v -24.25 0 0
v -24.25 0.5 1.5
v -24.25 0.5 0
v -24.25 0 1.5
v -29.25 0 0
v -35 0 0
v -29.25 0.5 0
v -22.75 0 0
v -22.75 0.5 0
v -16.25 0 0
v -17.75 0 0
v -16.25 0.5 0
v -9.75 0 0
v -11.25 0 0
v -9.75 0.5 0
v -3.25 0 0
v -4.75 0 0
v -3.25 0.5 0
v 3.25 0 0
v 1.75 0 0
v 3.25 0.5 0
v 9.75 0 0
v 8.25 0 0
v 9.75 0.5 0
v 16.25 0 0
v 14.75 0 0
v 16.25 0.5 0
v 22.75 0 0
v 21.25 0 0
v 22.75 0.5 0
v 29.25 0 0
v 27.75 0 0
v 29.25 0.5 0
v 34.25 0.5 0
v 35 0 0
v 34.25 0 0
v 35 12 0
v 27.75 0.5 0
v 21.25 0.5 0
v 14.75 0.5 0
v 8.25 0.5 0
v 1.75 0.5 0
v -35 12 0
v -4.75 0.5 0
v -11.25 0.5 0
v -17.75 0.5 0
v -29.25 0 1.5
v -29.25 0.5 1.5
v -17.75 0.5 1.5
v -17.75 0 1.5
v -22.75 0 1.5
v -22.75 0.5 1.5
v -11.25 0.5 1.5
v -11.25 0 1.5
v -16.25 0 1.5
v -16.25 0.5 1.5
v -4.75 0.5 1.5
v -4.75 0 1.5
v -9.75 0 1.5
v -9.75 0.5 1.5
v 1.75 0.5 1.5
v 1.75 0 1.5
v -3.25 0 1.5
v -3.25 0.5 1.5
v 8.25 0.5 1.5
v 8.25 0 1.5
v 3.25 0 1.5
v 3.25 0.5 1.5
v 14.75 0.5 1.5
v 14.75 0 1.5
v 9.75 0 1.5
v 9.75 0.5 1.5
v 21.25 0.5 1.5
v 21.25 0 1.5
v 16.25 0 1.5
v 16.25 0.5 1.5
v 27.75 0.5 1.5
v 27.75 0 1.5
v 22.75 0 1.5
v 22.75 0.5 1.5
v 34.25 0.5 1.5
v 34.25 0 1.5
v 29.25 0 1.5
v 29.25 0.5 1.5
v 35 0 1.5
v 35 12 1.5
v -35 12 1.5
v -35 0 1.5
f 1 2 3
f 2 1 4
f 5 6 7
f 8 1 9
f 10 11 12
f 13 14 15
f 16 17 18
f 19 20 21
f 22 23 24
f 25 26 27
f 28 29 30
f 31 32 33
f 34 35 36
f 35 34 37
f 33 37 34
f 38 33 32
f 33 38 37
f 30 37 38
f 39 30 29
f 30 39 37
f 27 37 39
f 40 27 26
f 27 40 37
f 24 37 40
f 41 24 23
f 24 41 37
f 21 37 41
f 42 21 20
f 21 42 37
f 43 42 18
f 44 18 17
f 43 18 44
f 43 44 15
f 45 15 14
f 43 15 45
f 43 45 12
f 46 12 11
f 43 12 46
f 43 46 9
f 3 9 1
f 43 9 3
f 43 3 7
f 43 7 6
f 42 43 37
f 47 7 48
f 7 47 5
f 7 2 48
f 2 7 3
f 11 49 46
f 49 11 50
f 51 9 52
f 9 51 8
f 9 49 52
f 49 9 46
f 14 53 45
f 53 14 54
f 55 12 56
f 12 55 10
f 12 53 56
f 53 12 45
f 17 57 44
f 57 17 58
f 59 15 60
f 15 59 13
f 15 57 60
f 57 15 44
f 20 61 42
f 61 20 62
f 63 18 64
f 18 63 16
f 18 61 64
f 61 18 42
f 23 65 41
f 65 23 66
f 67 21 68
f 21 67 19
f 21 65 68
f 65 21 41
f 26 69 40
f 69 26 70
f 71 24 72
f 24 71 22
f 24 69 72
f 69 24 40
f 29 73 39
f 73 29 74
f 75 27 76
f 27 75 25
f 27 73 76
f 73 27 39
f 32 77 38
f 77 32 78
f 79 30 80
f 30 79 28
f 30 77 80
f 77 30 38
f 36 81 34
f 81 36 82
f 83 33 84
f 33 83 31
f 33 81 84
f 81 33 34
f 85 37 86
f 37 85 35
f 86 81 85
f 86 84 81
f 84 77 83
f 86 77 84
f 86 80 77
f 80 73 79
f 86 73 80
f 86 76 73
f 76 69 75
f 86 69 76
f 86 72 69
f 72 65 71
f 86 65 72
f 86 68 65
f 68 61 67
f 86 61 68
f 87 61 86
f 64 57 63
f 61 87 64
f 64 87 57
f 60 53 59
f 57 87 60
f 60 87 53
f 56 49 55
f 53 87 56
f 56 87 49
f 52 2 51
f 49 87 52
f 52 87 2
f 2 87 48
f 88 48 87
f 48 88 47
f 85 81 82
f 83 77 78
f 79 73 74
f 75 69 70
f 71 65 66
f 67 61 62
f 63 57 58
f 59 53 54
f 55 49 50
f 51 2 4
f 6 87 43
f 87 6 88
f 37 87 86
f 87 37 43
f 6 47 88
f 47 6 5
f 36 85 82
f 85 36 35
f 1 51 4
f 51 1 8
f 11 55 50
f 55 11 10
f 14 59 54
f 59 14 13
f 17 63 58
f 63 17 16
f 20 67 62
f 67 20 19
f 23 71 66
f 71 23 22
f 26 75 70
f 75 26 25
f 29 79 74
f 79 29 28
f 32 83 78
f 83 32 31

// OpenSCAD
// 10-well agarose gel comb, printed lying flat
// Units: mm

plate_t      = 1.5;   // plate thickness (Z)
spine_l      = 70;    // spine length (X)
spine_w      = 12;    // spine width (Y)
teeth_n      = 10;    // number of teeth
teeth_w      = 5;     // tooth width (X)
teeth_l      = 12;    // tooth length (Y)
teeth_gap    = 1.5;   // gap between teeth (X)
overcut      = 0.5;   // cutter overshoot past faces

$fn = 64;

pitch = teeth_w + teeth_gap;
x0    = -(teeth_n - 1) * pitch / 2;   // first tooth centre X

difference() {
    // Spine
    translate([-spine_l / 2, 0, 0])
        cube([spine_l, spine_w, plate_t]);

    // Teeth hanging in -Y
    for (i = [0 : teeth_n - 1])
        translate([x0 + i * pitch, -teeth_l, 0])
            cube([teeth_w, teeth_l + overcut, plate_t + overcut]);
}
